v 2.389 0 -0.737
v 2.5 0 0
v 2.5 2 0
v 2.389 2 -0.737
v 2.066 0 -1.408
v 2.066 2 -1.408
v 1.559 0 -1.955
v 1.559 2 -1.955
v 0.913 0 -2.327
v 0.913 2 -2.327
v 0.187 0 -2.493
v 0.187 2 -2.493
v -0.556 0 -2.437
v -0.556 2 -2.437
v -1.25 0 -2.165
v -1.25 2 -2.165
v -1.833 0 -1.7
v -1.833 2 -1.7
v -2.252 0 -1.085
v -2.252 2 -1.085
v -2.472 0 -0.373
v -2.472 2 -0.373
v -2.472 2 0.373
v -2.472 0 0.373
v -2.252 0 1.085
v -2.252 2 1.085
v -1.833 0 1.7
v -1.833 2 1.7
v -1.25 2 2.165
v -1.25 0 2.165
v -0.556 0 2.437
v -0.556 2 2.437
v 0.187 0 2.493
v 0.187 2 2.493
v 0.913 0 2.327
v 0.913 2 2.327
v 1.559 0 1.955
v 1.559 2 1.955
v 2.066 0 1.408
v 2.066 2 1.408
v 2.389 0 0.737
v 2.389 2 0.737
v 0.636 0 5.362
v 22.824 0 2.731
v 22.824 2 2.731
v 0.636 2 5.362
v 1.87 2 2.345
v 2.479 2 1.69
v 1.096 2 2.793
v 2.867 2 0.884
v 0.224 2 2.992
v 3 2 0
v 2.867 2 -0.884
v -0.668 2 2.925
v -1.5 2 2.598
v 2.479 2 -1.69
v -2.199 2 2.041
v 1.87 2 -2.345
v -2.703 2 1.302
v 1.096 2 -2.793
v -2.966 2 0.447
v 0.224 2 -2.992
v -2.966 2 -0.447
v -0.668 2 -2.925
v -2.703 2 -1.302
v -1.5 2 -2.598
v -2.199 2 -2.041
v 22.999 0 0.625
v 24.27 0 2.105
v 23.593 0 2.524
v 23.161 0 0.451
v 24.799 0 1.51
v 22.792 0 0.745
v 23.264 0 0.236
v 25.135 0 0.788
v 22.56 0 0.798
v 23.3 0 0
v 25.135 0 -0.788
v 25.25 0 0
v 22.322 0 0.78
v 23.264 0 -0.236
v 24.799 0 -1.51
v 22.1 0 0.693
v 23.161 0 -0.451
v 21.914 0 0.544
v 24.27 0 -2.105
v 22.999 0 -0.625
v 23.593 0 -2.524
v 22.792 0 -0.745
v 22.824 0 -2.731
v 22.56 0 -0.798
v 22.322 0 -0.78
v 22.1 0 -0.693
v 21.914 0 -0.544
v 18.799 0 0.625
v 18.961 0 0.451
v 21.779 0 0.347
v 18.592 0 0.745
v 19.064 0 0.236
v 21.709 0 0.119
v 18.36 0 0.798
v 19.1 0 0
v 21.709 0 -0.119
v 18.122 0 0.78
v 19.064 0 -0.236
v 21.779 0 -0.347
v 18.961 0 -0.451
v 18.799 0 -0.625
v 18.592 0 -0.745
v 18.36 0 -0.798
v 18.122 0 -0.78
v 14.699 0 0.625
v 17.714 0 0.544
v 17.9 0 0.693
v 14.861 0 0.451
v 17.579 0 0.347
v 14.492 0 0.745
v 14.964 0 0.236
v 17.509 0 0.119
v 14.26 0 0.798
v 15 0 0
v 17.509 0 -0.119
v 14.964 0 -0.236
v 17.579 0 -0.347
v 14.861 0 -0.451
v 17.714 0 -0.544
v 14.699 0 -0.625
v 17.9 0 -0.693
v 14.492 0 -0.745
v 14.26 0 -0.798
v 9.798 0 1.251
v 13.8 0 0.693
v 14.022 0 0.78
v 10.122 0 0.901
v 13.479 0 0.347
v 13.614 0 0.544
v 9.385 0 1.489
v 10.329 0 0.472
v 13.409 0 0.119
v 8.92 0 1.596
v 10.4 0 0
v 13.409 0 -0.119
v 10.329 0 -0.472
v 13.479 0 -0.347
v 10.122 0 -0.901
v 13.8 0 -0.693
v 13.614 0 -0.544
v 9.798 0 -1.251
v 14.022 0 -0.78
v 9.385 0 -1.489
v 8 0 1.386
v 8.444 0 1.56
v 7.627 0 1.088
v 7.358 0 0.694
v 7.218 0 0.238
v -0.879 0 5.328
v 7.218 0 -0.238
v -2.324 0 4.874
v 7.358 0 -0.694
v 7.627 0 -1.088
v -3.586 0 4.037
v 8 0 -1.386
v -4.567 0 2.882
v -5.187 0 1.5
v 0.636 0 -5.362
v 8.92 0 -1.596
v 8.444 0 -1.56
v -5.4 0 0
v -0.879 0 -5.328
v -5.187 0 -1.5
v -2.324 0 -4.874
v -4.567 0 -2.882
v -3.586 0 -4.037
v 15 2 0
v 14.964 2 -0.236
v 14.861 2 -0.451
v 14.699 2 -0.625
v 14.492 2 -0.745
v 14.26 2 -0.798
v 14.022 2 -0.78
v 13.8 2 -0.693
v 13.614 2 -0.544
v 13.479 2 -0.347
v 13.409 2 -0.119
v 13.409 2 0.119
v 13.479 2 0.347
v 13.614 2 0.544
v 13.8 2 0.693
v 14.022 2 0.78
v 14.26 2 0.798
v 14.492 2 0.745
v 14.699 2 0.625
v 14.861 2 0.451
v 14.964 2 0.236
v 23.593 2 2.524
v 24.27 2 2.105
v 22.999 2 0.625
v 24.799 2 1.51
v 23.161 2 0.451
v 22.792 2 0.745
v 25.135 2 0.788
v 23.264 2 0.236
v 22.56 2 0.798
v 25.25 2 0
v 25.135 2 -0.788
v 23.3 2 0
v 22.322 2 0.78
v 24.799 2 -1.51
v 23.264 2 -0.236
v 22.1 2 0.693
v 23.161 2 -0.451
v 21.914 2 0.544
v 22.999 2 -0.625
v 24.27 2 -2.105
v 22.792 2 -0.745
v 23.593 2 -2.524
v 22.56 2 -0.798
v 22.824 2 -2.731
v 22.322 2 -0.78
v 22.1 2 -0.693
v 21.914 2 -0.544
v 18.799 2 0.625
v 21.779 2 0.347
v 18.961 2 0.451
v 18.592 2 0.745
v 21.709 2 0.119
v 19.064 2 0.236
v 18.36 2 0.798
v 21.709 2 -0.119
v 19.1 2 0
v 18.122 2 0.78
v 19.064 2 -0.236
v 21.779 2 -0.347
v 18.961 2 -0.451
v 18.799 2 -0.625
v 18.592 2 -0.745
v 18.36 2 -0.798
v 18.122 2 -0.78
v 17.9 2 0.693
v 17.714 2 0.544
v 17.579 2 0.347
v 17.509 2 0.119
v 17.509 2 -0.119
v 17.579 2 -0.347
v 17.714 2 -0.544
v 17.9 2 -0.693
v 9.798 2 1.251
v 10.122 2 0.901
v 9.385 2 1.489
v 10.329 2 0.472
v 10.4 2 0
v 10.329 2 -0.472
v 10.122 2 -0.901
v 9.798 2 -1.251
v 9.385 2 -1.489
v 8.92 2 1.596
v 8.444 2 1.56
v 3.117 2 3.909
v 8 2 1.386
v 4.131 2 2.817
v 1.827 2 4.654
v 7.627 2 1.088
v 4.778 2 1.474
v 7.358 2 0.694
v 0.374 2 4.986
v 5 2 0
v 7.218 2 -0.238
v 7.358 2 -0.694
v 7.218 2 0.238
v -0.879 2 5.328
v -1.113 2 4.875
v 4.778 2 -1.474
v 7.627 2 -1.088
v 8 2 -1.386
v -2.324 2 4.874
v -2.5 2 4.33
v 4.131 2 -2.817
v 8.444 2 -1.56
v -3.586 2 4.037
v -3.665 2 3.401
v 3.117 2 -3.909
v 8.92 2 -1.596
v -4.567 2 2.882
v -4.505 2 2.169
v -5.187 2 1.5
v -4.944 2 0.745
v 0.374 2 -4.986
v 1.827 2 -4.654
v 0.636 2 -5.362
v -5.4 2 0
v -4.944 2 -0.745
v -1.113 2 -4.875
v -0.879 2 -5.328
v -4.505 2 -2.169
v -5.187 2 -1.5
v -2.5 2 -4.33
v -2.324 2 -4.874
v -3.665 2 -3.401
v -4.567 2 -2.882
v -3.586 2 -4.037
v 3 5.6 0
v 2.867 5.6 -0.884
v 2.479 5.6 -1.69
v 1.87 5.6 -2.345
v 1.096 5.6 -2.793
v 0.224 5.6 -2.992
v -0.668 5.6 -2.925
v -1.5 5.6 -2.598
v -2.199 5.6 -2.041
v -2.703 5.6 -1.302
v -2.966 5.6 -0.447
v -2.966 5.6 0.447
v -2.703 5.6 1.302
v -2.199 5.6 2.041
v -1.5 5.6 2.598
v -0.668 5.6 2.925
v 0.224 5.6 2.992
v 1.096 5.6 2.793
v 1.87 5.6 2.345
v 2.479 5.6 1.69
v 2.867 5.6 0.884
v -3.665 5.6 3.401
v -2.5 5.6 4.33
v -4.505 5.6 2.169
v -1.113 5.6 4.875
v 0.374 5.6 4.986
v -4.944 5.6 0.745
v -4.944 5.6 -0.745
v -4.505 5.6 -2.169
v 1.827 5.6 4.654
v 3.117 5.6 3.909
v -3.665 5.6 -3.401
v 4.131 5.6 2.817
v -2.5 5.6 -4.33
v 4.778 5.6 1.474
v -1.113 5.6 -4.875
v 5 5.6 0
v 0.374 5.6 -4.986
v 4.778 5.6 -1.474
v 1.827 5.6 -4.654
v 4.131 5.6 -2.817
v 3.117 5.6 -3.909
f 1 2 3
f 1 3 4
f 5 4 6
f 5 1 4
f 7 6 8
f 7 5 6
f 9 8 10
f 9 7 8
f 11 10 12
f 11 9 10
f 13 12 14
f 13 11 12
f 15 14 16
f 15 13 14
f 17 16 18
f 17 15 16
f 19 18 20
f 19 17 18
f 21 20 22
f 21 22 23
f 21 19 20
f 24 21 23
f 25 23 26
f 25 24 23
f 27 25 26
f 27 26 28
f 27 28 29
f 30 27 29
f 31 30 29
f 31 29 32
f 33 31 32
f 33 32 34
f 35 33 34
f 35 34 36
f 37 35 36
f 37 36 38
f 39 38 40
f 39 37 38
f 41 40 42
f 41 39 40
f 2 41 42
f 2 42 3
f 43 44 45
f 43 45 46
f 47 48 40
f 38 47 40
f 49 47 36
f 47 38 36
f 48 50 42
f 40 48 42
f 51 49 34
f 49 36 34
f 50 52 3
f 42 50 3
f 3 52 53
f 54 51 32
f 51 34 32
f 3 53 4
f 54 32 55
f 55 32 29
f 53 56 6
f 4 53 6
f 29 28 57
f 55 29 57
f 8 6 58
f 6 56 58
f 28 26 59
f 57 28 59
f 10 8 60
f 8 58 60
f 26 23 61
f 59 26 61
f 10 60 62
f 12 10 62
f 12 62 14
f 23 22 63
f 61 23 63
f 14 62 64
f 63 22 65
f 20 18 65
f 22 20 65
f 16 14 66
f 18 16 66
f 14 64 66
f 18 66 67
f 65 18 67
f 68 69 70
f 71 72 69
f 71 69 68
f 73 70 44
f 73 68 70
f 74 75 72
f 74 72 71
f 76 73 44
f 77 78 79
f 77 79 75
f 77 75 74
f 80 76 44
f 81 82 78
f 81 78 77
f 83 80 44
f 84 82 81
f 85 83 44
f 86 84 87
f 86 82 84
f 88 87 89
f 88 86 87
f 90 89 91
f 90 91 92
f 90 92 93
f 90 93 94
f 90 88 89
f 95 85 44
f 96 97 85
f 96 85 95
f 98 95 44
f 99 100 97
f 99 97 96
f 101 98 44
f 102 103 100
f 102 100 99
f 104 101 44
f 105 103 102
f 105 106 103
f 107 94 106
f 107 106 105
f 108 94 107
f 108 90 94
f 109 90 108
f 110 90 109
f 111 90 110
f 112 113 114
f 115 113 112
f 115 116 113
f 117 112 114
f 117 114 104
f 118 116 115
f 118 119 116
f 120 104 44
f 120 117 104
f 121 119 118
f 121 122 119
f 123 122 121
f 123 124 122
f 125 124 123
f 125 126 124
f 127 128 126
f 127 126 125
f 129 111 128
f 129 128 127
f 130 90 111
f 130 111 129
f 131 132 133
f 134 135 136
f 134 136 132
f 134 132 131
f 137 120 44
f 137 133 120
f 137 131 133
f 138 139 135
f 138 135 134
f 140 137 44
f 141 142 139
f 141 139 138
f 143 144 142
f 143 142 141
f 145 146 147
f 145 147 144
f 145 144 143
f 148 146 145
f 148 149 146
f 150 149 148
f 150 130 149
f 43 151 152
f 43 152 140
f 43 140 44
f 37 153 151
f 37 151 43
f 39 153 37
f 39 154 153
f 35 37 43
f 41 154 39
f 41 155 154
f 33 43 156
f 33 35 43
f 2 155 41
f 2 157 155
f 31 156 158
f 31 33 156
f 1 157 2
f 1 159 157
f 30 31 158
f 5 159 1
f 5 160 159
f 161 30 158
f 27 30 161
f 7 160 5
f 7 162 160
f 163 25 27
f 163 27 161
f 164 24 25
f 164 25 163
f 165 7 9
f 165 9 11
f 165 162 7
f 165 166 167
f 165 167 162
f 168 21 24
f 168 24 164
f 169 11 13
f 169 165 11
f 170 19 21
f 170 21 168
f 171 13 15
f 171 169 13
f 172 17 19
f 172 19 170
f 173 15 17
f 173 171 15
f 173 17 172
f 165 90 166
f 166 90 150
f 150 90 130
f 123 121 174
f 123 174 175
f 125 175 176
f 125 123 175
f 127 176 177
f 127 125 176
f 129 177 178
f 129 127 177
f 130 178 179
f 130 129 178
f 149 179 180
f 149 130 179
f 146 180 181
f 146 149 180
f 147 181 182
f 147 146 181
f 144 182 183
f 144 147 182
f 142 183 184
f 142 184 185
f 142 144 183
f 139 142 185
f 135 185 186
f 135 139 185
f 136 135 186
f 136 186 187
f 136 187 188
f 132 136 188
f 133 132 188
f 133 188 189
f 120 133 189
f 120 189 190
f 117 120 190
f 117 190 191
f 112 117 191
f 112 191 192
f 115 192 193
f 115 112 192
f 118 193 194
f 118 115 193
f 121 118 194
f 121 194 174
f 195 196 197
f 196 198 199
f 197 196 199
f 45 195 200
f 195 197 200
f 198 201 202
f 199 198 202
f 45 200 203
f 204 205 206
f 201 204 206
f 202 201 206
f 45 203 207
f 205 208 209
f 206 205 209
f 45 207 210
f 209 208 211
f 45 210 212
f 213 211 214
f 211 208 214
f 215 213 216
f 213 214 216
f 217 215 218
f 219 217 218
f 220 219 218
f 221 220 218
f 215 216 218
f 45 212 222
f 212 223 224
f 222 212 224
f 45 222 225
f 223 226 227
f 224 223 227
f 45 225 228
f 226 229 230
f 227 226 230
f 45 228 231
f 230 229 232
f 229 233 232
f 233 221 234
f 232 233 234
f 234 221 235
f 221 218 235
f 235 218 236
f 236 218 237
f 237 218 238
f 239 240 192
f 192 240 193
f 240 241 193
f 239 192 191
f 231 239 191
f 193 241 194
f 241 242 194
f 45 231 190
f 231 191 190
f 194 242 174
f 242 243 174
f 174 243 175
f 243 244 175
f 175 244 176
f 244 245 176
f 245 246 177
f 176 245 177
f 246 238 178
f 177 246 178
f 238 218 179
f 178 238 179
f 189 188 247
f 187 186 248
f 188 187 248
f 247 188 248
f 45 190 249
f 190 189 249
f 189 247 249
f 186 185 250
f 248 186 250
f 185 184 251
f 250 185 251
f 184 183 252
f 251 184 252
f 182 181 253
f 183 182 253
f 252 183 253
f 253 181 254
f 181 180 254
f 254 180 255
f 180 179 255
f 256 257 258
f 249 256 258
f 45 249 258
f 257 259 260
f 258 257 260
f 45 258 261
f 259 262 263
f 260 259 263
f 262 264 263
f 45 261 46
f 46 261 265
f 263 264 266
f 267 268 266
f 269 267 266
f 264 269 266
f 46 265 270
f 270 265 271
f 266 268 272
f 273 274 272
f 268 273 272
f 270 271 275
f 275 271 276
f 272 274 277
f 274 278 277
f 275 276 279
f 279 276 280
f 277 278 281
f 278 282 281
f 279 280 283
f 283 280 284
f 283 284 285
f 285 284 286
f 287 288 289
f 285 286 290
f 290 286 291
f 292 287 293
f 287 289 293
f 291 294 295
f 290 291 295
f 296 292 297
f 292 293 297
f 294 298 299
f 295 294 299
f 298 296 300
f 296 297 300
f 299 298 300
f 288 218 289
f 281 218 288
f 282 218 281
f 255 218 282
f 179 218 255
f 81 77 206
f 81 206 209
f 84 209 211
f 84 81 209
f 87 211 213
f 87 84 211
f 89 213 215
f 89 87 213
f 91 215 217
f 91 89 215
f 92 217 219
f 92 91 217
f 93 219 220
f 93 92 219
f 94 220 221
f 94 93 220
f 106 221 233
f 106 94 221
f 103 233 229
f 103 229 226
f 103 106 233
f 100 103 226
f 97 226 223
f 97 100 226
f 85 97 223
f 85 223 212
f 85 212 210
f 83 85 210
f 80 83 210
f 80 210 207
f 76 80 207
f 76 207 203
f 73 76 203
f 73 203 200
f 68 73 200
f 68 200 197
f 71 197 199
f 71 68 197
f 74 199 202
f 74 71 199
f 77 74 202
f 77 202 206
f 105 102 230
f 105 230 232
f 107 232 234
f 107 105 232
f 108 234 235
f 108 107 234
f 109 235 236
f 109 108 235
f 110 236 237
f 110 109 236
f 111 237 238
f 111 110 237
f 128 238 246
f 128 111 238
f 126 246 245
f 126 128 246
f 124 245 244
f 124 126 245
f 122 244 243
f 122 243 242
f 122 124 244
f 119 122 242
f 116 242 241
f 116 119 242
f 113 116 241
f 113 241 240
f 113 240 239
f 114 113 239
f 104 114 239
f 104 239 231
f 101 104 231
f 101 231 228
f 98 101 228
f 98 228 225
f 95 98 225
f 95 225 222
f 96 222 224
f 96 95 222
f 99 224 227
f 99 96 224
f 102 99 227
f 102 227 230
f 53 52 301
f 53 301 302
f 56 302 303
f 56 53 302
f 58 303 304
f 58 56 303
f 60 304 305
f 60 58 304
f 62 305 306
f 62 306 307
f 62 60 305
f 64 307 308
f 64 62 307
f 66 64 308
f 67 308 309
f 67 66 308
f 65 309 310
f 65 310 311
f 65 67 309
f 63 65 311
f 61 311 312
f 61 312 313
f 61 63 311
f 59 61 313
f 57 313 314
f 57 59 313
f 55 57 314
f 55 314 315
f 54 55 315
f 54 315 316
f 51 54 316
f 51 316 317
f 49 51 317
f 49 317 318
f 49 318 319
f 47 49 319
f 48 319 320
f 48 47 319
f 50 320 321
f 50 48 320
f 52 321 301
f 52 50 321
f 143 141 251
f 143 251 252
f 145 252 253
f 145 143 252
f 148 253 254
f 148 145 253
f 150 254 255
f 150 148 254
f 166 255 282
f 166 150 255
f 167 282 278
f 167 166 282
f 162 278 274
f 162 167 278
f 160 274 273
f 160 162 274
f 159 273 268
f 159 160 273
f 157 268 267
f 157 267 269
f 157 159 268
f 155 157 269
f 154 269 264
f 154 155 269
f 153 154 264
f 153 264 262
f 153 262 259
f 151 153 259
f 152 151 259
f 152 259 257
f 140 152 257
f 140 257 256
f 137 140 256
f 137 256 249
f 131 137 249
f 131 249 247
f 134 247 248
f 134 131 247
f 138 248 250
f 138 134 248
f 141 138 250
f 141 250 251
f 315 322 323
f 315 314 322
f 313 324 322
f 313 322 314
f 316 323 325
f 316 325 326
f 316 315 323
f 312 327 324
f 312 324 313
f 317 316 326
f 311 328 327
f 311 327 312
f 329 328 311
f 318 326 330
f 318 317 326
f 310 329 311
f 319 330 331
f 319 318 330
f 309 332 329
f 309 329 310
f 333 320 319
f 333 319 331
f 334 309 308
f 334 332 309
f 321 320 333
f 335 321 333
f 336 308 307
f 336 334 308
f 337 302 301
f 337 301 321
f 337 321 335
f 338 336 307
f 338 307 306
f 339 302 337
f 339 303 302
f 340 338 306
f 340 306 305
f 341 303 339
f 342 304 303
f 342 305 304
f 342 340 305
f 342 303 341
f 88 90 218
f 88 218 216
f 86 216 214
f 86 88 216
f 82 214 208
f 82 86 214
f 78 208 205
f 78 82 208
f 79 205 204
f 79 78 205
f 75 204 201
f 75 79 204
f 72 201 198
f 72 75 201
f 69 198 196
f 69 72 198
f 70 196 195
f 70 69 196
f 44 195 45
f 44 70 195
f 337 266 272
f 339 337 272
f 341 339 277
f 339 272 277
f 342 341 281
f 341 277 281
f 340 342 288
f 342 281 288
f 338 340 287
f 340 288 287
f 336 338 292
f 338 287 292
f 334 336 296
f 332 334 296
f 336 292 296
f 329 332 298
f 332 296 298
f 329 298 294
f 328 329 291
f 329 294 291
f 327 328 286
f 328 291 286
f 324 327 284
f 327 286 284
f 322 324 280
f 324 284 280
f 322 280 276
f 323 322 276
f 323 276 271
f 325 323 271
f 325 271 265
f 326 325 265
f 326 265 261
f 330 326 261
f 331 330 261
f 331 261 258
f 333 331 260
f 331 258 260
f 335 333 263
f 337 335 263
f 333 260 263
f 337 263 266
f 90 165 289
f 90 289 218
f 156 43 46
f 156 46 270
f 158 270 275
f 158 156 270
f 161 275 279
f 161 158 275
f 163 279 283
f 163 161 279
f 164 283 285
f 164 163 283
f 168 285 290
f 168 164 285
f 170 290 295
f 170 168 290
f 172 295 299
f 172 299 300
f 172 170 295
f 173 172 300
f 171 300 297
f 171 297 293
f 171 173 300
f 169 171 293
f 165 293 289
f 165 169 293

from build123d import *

# Parameters (mm, degrees)
SKETCH_1_R        = 2.5
SKETCH_1_R_2      = 1.6
SKETCH_1_R_3      = 0.8
EXTRUDE_1_DEPTH   = 2
SKETCH_4_R        = 5
SKETCH_4_R_2      = 3
EXTRUDE_1_2_DEPTH = 3.6


with BuildPart() as part:
    # 草圖1 → Extrude 1 (new body)
    with BuildSketch(Plane(origin=(0, 0, 0), x_dir=(1, 0, 0), z_dir=(0, 1, 0))):
        with BuildLine():
            Line((0.636, 5.362415873), (22.823888889, 2.730859936))
            ThreePointArc((22.823888889, 2.730859936), (25.25, 0), (22.823888889, -2.730859936))
            Line((22.823888889, -2.730859936), (0.636, -5.362415873))
            ThreePointArc((0.636, -5.362415873), (-5.4, 0), (0.636, 5.362415873))
        make_face()
        Circle(SKETCH_1_R, mode=Mode.SUBTRACT)
        with Locations((8.8, 0)):
            Circle(SKETCH_1_R_2, mode=Mode.SUBTRACT)
        with Locations((14.2, 0)):
            Circle(SKETCH_1_R_3, mode=Mode.SUBTRACT)
        with Locations((18.3, 0)):
            Circle(SKETCH_1_R_3, mode=Mode.SUBTRACT)
        with Locations((22.5, 0)):
            Circle(SKETCH_1_R_3, mode=Mode.SUBTRACT)
    extrude(amount=EXTRUDE_1_DEPTH)

    # 草圖4 → Extrude 1 2 (add)
    with BuildSketch(Plane(origin=(0, 2, 0), x_dir=(1, 0, 0), z_dir=(0, 1, 0))):
        Circle(SKETCH_4_R)
        Circle(SKETCH_4_R_2, mode=Mode.SUBTRACT)
    extrude(amount=EXTRUDE_1_2_DEPTH)


solid = part.part
